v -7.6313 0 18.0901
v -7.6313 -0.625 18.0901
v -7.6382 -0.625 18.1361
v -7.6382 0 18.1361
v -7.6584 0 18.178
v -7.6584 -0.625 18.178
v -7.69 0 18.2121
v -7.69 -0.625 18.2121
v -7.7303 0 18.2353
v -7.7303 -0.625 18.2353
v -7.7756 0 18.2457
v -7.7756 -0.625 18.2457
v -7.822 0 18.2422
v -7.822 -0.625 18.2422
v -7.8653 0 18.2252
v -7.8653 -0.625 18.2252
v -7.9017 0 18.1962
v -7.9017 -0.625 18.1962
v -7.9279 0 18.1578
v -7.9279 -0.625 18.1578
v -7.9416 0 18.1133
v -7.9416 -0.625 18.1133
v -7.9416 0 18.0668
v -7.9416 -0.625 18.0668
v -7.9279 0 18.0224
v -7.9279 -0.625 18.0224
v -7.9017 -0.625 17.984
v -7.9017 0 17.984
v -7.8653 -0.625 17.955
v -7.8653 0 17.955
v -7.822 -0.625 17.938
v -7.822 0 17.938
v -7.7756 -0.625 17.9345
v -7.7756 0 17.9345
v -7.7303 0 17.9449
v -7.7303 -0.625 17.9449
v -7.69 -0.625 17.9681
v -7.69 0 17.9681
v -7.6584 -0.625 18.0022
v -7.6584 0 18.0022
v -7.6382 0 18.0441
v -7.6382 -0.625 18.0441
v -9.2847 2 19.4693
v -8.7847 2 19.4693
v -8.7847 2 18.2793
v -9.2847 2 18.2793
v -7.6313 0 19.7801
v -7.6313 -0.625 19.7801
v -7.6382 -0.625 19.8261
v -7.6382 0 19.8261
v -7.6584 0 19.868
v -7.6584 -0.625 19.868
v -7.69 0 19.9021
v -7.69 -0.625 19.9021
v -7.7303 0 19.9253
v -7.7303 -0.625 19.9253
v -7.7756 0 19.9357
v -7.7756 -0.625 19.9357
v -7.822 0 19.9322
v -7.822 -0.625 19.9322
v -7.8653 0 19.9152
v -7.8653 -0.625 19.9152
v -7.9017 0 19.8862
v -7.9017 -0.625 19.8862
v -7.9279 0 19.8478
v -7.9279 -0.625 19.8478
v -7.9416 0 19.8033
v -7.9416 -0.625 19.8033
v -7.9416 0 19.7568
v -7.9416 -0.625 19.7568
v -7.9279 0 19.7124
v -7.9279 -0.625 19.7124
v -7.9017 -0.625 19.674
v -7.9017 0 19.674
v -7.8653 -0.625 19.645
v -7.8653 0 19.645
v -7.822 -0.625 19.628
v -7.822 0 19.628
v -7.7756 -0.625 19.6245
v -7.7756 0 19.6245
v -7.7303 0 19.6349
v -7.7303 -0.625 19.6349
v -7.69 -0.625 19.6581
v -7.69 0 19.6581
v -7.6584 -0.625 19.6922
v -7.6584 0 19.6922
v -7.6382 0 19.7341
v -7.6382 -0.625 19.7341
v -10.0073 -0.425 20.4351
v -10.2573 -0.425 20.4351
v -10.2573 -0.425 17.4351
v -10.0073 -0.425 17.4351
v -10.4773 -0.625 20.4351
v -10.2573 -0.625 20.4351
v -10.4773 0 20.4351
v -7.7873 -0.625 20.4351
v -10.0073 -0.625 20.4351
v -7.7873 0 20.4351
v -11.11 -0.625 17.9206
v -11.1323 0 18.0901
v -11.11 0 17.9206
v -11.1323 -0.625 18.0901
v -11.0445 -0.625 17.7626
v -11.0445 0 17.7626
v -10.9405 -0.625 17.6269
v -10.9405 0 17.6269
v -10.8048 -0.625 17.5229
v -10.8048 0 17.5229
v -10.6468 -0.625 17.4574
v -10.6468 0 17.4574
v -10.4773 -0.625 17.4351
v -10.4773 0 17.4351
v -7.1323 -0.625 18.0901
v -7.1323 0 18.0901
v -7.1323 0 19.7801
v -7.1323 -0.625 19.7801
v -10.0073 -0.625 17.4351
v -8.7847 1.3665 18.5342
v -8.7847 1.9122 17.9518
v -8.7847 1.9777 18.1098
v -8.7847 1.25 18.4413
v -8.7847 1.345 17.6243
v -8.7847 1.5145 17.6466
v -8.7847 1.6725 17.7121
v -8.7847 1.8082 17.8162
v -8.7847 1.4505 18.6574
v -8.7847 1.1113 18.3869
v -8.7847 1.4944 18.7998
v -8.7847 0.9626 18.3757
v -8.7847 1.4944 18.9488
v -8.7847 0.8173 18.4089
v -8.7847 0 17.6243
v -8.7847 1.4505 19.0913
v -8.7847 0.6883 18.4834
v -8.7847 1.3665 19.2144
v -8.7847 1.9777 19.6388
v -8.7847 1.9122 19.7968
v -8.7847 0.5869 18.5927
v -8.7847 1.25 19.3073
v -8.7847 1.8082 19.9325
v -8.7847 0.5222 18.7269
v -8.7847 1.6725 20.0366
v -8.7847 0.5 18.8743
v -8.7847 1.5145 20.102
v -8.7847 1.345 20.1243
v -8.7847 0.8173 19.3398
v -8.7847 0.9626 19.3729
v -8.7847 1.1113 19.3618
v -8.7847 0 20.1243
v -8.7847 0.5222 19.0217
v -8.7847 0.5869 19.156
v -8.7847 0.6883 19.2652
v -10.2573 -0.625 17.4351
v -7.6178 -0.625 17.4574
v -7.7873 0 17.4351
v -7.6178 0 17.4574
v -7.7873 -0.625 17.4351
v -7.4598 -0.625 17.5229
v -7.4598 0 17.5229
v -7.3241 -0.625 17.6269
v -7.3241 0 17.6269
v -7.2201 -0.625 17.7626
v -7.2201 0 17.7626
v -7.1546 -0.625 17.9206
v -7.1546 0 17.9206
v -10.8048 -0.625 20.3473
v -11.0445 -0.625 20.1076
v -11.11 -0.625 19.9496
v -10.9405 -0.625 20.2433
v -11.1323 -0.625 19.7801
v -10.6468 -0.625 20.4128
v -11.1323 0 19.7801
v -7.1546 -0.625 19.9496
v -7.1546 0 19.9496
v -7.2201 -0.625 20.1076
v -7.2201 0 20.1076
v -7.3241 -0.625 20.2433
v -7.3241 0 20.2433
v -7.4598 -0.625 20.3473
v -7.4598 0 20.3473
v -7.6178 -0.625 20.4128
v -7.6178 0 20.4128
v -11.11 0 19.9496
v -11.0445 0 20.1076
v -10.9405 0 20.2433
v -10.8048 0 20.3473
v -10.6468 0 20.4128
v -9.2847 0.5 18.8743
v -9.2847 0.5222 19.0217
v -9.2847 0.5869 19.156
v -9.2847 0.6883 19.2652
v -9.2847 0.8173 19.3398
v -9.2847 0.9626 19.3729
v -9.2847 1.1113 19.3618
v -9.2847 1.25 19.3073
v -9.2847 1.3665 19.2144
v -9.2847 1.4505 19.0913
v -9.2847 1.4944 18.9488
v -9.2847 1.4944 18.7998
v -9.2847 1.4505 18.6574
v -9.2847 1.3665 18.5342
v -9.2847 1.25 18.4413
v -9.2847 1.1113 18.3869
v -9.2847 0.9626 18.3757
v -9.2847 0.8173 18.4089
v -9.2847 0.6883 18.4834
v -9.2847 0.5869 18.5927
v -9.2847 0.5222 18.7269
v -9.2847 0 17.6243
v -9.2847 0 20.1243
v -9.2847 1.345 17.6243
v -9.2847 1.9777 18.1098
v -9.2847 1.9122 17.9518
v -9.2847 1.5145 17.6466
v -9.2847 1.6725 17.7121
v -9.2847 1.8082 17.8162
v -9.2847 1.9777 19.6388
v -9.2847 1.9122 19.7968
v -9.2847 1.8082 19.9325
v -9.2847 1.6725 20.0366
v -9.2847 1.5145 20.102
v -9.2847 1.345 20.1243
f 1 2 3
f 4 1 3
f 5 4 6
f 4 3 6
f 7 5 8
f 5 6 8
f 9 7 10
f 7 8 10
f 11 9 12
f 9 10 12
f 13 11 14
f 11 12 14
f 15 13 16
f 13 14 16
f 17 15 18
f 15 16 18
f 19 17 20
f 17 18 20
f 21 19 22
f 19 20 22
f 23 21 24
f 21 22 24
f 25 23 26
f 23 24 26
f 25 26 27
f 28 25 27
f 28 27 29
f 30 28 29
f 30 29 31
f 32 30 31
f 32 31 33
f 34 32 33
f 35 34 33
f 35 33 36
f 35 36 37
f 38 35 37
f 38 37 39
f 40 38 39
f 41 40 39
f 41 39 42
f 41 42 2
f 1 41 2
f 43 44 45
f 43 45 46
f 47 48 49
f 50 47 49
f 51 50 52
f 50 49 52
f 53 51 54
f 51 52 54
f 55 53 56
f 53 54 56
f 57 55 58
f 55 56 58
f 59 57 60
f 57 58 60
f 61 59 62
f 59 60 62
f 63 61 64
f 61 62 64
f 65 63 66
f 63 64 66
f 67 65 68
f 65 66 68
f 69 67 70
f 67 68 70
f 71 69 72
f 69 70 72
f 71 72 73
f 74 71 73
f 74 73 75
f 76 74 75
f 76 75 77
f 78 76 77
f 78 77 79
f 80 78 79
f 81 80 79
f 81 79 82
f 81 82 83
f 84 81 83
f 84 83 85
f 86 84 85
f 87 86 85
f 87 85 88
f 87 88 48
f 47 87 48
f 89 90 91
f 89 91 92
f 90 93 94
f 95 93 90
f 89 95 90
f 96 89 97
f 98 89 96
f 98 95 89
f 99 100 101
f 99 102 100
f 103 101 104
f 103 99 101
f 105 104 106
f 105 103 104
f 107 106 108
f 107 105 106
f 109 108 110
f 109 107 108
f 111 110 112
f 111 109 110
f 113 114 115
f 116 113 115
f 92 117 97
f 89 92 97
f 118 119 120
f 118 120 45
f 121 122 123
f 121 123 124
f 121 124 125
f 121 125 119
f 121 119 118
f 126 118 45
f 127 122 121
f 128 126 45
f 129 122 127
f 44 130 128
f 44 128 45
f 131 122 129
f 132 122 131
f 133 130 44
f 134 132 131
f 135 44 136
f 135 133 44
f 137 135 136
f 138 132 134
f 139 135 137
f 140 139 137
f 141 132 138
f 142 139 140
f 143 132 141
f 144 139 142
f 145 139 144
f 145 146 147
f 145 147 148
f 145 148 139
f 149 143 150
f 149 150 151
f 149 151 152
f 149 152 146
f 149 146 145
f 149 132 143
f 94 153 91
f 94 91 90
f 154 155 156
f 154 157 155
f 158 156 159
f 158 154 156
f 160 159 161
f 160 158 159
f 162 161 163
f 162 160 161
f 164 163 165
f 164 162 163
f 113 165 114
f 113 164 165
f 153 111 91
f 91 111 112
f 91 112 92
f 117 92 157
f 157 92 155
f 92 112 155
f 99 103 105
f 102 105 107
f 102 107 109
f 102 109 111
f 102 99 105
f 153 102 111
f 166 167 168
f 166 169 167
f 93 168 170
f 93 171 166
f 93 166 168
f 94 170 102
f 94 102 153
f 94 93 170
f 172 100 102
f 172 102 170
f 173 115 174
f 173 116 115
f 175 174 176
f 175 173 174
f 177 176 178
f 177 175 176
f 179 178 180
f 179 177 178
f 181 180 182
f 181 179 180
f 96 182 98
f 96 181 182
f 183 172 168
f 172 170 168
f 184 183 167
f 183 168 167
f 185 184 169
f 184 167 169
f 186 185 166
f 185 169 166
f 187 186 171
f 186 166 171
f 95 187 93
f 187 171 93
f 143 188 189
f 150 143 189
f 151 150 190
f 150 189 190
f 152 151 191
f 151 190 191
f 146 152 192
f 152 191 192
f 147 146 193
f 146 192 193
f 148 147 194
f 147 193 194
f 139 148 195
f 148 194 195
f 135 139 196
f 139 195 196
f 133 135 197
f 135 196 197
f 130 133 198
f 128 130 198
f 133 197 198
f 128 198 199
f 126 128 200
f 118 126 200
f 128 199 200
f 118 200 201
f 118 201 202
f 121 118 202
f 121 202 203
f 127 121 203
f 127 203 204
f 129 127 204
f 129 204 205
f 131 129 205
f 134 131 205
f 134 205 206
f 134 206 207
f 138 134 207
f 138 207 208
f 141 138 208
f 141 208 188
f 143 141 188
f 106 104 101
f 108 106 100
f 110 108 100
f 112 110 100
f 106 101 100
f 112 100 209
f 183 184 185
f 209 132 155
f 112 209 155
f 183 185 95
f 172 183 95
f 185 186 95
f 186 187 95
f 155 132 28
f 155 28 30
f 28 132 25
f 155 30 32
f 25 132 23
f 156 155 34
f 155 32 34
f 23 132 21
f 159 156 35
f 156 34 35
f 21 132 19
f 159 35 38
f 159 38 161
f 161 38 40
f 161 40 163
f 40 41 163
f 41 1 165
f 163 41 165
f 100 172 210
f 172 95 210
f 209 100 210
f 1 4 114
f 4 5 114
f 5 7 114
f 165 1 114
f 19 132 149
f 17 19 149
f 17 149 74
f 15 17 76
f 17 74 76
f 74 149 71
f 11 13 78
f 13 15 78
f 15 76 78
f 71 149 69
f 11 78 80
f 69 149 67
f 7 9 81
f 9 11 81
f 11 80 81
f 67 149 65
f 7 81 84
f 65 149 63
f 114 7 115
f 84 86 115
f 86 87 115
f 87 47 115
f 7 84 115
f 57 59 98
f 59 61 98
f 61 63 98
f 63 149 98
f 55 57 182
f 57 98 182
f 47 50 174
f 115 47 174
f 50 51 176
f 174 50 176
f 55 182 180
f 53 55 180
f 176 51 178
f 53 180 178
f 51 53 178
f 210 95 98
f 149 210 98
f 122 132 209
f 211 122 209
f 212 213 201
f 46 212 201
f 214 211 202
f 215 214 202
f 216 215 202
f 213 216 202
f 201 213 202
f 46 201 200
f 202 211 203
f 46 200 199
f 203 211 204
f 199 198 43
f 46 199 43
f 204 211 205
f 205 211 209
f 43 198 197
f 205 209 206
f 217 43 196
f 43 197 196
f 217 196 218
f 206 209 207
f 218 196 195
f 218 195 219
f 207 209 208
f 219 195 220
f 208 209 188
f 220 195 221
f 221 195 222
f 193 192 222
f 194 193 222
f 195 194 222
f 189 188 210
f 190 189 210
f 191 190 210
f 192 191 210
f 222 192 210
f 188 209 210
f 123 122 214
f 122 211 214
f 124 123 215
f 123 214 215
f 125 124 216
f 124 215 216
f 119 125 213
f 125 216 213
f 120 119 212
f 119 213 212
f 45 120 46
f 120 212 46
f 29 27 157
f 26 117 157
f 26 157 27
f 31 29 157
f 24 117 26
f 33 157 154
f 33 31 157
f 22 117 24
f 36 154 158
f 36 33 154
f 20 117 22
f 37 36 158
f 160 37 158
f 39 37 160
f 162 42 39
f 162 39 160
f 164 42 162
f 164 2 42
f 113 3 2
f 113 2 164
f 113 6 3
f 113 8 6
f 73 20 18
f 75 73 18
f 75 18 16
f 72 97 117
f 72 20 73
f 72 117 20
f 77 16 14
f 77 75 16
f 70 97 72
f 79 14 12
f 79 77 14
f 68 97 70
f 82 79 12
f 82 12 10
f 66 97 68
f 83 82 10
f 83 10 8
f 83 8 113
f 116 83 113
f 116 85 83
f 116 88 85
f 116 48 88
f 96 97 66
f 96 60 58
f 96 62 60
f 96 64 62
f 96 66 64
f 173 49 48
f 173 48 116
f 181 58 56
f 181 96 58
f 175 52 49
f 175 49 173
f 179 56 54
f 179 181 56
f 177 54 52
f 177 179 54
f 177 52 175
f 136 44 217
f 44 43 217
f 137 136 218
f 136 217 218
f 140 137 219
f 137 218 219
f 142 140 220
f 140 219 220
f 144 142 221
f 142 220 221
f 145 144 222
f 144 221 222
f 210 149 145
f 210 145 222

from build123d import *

# Parameters (mm, degrees)
F0_W      = 4
F0_H      = 3
F1_DEPTH  = 0.625
F2_R      = 0.655
F3_W      = 0.25
F3_H      = 3
F4_DEPTH  = 0.2
F5_R      = 0.156
F6_DEPTH  = 25
F7_W      = 0.5
F7_H      = 2.5
F8_DEPTH  = 2
F9_R      = 0.5
F10_DEPTH = 25
F11_R     = 0.655
F12_R     = 0.655


with BuildPart() as f1:
    # F0 (on Front) → F1 (new body)
    with BuildSketch(Plane.XZ):
        with Locations((-9.132301, 18.935098)):
            Rectangle(F0_W, F0_H)
    extrude(amount=F1_DEPTH)

    # F2
    f2_edges = [f1.edges().sort_by_distance(p)[0] for p in [
        (-11.132301, -0.3125, 17.435098),
        (-7.132301, -0.3125, 17.435098),
        (-7.132301, -0.3125, 20.435098),
        (-11.132301, -0.3125, 20.435098),
    ]]
    fillet(f2_edges, radius=F2_R)

    # F3 (on face) → F4 (cut)
    with BuildSketch(Plane.XZ.offset(0.625)):
        with Locations((-10.132301, 18.935098)):
            Rectangle(F3_W, F3_H)
    extrude(amount=-F4_DEPTH, mode=Mode.SUBTRACT)

    # F5 (on face) → F6 (cut)
    with BuildSketch(Plane.XZ.offset(0.625)):
        with Locations((-7.787301, 19.780098)):
            Circle(F5_R)
        with Locations((-7.787301, 18.090098)):
            Circle(F5_R)
    extrude(amount=-F6_DEPTH, mode=Mode.SUBTRACT)

    # F7 (on face) → F8 (join)
    with BuildSketch(Plane(origin=(0, 0, 0), x_dir=(-1, 0, 0), z_dir=(0, 1, 0))):
        with Locations((9.034656, 18.874316)):
            Rectangle(F7_W, F7_H)
    extrude(amount=F8_DEPTH)

    # F9 (on face) → F10 (cut)
    with BuildSketch(Plane(origin=(-9.284656, 0, 0), x_dir=(0, -1, 0), z_dir=(-1, 0, 0))):
        with Locations((-1, 18.874316)):
            Circle(F9_R)
    extrude(amount=-F10_DEPTH, mode=Mode.SUBTRACT)

    # F11
    f11_edges = [f1.edges().sort_by_distance(p)[0] for p in [
        (-9.034656, 2, 17.624316),
    ]]
    fillet(f11_edges, radius=F11_R)

    # F12
    f12_edges = [f1.edges().sort_by_distance(p)[0] for p in [
        (-9.034656, 2, 20.124316),
    ]]
    fillet(f12_edges, radius=F12_R)


solid = f1.part
